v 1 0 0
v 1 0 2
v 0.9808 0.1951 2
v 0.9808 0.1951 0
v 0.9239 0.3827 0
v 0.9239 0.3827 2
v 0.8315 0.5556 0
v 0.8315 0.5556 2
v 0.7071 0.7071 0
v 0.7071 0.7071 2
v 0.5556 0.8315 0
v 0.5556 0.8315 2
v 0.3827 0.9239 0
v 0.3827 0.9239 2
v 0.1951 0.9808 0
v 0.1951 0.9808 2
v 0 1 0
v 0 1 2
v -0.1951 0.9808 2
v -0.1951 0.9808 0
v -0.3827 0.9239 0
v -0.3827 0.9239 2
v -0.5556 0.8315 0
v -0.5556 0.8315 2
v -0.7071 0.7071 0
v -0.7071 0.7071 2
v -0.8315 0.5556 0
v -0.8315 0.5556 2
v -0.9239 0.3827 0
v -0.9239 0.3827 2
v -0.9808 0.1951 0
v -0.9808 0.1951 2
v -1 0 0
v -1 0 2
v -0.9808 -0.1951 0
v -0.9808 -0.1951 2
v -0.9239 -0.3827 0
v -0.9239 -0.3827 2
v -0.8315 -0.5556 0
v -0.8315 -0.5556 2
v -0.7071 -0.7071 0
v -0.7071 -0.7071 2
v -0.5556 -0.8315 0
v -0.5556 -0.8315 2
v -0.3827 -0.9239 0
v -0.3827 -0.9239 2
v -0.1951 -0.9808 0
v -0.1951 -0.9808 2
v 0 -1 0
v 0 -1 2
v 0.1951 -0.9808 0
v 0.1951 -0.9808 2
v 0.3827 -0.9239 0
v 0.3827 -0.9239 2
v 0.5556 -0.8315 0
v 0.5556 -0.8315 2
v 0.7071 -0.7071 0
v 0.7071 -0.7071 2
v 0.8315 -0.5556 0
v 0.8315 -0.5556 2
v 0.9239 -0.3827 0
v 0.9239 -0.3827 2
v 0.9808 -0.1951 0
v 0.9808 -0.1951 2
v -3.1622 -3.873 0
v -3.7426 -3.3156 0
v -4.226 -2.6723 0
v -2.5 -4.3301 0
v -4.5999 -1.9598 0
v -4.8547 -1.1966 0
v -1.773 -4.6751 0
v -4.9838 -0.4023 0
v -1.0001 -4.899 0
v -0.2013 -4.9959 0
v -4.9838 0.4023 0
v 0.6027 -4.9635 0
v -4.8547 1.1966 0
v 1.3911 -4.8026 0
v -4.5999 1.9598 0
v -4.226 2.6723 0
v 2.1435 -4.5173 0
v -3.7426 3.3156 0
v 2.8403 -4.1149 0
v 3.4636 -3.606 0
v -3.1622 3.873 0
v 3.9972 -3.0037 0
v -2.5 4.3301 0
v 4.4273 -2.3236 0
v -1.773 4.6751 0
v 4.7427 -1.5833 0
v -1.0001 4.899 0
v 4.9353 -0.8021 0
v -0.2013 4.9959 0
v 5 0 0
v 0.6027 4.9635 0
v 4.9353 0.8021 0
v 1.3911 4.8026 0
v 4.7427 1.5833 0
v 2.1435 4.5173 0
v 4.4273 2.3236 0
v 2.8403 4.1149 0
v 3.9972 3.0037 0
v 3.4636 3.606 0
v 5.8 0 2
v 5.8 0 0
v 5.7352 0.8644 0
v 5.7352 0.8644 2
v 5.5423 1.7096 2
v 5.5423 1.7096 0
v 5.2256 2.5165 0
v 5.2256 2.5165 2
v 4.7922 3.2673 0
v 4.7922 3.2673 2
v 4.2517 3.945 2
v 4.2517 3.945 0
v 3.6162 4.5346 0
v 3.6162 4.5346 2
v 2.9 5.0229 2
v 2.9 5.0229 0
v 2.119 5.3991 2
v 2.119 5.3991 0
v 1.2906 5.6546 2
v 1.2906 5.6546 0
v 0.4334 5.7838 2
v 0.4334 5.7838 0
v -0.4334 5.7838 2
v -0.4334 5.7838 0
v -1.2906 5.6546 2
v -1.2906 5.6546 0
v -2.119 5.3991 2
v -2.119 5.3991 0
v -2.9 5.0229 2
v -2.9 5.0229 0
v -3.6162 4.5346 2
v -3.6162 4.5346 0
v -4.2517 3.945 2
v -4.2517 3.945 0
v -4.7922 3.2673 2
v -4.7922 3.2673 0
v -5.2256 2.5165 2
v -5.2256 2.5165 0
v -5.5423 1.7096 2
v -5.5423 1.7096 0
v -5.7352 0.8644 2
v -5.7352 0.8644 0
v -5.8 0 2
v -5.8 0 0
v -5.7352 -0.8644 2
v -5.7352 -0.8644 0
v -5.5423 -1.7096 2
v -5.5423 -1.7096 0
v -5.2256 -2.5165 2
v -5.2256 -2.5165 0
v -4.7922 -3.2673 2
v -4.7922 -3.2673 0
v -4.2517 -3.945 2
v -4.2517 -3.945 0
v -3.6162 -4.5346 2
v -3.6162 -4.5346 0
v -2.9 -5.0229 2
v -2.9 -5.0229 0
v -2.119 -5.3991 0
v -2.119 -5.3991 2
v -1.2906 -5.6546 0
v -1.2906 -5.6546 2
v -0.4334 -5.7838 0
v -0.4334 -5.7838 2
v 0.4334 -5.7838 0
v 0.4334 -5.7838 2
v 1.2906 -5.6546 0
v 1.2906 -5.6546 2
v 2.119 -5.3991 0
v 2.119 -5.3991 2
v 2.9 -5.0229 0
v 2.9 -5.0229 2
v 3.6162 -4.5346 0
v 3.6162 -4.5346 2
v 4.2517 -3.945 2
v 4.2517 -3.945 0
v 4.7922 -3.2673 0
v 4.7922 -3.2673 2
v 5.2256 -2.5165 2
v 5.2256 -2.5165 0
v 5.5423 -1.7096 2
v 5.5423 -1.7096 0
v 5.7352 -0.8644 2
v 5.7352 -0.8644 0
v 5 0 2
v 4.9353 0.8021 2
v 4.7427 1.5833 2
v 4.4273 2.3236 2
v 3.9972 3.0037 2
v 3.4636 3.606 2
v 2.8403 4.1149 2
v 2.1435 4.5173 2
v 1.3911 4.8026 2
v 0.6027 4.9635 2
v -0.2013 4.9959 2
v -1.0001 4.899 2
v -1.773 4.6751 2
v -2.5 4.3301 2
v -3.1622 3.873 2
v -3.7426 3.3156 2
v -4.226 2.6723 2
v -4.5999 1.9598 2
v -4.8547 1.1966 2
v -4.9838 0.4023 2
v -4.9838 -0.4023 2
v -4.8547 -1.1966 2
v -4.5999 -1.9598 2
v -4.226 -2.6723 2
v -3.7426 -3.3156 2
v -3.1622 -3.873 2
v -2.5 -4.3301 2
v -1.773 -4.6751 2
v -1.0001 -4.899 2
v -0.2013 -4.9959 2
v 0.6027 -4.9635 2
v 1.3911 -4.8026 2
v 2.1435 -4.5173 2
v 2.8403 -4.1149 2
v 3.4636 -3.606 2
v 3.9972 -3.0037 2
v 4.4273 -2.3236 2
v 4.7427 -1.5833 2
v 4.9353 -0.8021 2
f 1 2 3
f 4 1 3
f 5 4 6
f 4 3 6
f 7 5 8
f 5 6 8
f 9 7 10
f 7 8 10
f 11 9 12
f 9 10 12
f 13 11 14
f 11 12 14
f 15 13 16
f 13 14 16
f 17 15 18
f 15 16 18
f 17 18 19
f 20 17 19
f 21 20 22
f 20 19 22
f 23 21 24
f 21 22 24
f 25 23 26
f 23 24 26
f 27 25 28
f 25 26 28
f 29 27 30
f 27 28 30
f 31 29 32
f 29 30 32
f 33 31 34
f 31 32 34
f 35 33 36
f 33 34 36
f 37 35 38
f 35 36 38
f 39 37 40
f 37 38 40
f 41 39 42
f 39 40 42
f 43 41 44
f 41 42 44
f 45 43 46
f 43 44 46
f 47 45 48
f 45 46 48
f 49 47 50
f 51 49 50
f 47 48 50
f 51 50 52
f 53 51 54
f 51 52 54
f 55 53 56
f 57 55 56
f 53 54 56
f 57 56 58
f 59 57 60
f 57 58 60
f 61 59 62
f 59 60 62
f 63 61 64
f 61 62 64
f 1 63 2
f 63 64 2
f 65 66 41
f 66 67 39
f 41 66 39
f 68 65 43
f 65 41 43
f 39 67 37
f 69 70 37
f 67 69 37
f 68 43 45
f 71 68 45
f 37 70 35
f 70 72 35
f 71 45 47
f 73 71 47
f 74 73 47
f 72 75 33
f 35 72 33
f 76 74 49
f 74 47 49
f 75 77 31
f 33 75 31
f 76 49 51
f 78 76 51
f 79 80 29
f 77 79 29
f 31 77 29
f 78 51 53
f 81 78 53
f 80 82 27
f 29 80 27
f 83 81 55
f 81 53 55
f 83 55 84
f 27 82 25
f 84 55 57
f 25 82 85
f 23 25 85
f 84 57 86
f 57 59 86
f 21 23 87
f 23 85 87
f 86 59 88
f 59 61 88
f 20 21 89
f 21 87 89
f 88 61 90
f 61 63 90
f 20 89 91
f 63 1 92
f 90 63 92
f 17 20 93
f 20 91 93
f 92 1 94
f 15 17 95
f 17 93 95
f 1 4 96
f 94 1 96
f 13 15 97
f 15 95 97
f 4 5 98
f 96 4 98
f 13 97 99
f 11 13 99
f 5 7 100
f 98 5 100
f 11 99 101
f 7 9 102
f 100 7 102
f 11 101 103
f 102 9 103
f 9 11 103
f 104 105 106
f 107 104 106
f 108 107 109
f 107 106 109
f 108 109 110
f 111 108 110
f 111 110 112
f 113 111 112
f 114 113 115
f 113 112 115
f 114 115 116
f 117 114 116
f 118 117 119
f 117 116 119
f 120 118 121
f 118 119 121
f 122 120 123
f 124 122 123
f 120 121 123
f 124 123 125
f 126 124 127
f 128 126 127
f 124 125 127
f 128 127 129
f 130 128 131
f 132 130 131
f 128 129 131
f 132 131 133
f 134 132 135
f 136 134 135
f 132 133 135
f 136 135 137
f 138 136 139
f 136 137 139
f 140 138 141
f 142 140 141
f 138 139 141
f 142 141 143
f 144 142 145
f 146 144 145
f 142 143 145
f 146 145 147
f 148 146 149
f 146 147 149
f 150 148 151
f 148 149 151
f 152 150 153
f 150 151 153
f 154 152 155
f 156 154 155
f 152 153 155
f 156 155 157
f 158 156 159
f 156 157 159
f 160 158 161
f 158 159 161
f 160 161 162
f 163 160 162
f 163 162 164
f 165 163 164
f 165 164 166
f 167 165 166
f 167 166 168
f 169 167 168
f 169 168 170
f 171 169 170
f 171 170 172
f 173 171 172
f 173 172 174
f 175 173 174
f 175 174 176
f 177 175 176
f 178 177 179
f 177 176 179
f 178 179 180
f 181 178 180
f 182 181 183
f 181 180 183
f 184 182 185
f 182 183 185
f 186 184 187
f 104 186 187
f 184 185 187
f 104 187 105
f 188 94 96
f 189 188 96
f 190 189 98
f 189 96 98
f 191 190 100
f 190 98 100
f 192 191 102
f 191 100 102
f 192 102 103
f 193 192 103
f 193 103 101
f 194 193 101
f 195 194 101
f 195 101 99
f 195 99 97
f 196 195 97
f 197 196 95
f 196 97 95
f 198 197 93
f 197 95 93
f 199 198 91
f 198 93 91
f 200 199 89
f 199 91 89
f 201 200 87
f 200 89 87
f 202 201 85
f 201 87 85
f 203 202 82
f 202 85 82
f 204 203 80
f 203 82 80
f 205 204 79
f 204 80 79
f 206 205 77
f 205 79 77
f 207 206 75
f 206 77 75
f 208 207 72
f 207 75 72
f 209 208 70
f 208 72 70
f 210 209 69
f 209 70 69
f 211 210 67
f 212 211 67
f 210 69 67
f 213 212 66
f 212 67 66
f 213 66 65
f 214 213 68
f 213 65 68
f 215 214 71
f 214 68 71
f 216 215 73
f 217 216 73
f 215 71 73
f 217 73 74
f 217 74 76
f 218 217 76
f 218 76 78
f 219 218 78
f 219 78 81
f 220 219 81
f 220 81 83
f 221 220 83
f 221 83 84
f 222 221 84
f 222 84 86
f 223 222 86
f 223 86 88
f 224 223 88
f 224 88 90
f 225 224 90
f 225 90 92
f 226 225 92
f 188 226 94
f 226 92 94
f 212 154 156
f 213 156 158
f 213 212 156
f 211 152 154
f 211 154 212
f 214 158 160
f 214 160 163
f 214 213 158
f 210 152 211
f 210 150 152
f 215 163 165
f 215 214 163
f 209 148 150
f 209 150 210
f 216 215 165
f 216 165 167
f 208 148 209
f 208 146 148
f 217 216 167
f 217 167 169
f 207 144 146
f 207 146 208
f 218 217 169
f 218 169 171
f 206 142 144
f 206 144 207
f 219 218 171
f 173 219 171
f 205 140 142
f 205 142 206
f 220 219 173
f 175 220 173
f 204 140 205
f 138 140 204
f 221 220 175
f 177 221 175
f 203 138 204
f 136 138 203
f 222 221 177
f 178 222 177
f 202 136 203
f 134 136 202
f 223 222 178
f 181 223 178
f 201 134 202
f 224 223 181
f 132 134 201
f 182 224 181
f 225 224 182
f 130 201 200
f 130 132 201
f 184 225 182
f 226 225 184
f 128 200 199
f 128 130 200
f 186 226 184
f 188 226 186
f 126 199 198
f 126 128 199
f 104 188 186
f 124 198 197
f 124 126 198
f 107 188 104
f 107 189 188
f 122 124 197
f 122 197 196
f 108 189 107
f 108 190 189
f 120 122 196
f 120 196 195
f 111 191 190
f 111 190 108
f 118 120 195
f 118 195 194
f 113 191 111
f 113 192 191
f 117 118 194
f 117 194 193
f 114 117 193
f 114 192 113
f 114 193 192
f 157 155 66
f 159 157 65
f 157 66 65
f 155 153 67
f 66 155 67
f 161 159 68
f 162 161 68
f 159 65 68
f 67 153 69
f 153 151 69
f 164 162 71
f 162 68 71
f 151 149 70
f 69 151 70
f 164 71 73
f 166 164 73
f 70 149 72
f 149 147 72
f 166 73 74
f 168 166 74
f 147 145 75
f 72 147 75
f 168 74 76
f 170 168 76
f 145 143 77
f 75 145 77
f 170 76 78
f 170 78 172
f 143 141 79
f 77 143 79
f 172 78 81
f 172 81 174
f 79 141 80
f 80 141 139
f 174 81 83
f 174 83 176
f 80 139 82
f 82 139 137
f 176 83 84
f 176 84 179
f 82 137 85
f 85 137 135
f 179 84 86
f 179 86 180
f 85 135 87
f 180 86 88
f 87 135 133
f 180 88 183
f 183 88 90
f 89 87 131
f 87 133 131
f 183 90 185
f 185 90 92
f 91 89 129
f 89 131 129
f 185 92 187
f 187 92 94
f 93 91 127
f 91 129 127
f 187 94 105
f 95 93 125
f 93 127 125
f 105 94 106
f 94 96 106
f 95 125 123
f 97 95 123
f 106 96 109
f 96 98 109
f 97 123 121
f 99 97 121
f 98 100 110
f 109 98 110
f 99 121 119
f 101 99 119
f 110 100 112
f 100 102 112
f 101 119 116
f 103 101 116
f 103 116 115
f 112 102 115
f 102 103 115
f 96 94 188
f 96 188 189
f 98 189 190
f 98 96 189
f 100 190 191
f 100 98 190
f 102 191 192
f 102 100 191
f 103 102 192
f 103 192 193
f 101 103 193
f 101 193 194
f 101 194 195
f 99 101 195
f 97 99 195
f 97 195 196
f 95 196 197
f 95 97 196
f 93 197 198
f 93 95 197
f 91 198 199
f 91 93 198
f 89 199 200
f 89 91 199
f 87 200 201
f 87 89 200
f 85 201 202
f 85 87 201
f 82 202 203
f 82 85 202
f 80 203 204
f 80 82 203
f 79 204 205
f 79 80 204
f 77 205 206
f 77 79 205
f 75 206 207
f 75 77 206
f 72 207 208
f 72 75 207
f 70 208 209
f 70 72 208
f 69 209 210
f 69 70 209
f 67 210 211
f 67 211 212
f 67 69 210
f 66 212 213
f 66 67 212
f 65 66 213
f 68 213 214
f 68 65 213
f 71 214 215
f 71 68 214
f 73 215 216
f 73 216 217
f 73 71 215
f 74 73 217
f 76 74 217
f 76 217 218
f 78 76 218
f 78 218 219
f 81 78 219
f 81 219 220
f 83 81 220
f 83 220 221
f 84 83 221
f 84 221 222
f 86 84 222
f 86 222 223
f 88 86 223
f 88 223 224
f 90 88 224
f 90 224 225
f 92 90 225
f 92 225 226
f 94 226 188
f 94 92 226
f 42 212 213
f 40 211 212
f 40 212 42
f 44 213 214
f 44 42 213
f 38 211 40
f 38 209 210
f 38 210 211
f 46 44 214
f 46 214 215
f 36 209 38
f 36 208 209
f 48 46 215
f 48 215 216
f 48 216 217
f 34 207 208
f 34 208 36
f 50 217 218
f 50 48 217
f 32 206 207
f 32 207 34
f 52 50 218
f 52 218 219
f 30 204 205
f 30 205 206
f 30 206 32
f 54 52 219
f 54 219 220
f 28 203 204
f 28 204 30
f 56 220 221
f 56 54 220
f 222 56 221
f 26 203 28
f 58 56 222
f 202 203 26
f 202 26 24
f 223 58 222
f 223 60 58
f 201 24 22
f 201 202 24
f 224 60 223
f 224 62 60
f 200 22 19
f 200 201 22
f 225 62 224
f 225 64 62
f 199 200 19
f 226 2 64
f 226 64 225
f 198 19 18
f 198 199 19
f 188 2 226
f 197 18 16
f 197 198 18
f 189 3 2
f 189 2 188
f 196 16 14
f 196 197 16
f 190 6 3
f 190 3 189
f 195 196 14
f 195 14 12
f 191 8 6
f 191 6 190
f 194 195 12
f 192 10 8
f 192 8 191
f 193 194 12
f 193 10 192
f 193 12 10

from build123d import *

# Parameters (mm, degrees)
SKETCH1_R           = 5.8
SKETCH1_R_2         = 5
BOSS_EXTRUDE1_DEPTH = 2
SKETCH1_2_R         = 5
BOSS_EXTRUDE2_DEPTH = 2
SKETCH2_R           = 1
CUT_EXTRUDE1_DEPTH  = 2


with BuildPart() as part:
    # Sketch1 → Boss-Extrude1 (new body)
    with BuildSketch(Plane.XY):
        Circle(SKETCH1_R)
        Circle(SKETCH1_R_2, mode=Mode.SUBTRACT)
    extrude(amount=BOSS_EXTRUDE1_DEPTH)


with BuildPart() as body_2:
    # Sketch1<2> → Boss-Extrude2 (new body)
    with BuildSketch(Plane.XY):
        Circle(SKETCH1_2_R)
    extrude(amount=BOSS_EXTRUDE2_DEPTH)

    # Sketch2 → Cut-Extrude1 (cut)
    with BuildSketch(Plane.XY.offset(2)):
        Circle(SKETCH2_R)
    extrude(amount=-CUT_EXTRUDE1_DEPTH, mode=Mode.SUBTRACT)


solid = Compound([part.part, body_2.part])
